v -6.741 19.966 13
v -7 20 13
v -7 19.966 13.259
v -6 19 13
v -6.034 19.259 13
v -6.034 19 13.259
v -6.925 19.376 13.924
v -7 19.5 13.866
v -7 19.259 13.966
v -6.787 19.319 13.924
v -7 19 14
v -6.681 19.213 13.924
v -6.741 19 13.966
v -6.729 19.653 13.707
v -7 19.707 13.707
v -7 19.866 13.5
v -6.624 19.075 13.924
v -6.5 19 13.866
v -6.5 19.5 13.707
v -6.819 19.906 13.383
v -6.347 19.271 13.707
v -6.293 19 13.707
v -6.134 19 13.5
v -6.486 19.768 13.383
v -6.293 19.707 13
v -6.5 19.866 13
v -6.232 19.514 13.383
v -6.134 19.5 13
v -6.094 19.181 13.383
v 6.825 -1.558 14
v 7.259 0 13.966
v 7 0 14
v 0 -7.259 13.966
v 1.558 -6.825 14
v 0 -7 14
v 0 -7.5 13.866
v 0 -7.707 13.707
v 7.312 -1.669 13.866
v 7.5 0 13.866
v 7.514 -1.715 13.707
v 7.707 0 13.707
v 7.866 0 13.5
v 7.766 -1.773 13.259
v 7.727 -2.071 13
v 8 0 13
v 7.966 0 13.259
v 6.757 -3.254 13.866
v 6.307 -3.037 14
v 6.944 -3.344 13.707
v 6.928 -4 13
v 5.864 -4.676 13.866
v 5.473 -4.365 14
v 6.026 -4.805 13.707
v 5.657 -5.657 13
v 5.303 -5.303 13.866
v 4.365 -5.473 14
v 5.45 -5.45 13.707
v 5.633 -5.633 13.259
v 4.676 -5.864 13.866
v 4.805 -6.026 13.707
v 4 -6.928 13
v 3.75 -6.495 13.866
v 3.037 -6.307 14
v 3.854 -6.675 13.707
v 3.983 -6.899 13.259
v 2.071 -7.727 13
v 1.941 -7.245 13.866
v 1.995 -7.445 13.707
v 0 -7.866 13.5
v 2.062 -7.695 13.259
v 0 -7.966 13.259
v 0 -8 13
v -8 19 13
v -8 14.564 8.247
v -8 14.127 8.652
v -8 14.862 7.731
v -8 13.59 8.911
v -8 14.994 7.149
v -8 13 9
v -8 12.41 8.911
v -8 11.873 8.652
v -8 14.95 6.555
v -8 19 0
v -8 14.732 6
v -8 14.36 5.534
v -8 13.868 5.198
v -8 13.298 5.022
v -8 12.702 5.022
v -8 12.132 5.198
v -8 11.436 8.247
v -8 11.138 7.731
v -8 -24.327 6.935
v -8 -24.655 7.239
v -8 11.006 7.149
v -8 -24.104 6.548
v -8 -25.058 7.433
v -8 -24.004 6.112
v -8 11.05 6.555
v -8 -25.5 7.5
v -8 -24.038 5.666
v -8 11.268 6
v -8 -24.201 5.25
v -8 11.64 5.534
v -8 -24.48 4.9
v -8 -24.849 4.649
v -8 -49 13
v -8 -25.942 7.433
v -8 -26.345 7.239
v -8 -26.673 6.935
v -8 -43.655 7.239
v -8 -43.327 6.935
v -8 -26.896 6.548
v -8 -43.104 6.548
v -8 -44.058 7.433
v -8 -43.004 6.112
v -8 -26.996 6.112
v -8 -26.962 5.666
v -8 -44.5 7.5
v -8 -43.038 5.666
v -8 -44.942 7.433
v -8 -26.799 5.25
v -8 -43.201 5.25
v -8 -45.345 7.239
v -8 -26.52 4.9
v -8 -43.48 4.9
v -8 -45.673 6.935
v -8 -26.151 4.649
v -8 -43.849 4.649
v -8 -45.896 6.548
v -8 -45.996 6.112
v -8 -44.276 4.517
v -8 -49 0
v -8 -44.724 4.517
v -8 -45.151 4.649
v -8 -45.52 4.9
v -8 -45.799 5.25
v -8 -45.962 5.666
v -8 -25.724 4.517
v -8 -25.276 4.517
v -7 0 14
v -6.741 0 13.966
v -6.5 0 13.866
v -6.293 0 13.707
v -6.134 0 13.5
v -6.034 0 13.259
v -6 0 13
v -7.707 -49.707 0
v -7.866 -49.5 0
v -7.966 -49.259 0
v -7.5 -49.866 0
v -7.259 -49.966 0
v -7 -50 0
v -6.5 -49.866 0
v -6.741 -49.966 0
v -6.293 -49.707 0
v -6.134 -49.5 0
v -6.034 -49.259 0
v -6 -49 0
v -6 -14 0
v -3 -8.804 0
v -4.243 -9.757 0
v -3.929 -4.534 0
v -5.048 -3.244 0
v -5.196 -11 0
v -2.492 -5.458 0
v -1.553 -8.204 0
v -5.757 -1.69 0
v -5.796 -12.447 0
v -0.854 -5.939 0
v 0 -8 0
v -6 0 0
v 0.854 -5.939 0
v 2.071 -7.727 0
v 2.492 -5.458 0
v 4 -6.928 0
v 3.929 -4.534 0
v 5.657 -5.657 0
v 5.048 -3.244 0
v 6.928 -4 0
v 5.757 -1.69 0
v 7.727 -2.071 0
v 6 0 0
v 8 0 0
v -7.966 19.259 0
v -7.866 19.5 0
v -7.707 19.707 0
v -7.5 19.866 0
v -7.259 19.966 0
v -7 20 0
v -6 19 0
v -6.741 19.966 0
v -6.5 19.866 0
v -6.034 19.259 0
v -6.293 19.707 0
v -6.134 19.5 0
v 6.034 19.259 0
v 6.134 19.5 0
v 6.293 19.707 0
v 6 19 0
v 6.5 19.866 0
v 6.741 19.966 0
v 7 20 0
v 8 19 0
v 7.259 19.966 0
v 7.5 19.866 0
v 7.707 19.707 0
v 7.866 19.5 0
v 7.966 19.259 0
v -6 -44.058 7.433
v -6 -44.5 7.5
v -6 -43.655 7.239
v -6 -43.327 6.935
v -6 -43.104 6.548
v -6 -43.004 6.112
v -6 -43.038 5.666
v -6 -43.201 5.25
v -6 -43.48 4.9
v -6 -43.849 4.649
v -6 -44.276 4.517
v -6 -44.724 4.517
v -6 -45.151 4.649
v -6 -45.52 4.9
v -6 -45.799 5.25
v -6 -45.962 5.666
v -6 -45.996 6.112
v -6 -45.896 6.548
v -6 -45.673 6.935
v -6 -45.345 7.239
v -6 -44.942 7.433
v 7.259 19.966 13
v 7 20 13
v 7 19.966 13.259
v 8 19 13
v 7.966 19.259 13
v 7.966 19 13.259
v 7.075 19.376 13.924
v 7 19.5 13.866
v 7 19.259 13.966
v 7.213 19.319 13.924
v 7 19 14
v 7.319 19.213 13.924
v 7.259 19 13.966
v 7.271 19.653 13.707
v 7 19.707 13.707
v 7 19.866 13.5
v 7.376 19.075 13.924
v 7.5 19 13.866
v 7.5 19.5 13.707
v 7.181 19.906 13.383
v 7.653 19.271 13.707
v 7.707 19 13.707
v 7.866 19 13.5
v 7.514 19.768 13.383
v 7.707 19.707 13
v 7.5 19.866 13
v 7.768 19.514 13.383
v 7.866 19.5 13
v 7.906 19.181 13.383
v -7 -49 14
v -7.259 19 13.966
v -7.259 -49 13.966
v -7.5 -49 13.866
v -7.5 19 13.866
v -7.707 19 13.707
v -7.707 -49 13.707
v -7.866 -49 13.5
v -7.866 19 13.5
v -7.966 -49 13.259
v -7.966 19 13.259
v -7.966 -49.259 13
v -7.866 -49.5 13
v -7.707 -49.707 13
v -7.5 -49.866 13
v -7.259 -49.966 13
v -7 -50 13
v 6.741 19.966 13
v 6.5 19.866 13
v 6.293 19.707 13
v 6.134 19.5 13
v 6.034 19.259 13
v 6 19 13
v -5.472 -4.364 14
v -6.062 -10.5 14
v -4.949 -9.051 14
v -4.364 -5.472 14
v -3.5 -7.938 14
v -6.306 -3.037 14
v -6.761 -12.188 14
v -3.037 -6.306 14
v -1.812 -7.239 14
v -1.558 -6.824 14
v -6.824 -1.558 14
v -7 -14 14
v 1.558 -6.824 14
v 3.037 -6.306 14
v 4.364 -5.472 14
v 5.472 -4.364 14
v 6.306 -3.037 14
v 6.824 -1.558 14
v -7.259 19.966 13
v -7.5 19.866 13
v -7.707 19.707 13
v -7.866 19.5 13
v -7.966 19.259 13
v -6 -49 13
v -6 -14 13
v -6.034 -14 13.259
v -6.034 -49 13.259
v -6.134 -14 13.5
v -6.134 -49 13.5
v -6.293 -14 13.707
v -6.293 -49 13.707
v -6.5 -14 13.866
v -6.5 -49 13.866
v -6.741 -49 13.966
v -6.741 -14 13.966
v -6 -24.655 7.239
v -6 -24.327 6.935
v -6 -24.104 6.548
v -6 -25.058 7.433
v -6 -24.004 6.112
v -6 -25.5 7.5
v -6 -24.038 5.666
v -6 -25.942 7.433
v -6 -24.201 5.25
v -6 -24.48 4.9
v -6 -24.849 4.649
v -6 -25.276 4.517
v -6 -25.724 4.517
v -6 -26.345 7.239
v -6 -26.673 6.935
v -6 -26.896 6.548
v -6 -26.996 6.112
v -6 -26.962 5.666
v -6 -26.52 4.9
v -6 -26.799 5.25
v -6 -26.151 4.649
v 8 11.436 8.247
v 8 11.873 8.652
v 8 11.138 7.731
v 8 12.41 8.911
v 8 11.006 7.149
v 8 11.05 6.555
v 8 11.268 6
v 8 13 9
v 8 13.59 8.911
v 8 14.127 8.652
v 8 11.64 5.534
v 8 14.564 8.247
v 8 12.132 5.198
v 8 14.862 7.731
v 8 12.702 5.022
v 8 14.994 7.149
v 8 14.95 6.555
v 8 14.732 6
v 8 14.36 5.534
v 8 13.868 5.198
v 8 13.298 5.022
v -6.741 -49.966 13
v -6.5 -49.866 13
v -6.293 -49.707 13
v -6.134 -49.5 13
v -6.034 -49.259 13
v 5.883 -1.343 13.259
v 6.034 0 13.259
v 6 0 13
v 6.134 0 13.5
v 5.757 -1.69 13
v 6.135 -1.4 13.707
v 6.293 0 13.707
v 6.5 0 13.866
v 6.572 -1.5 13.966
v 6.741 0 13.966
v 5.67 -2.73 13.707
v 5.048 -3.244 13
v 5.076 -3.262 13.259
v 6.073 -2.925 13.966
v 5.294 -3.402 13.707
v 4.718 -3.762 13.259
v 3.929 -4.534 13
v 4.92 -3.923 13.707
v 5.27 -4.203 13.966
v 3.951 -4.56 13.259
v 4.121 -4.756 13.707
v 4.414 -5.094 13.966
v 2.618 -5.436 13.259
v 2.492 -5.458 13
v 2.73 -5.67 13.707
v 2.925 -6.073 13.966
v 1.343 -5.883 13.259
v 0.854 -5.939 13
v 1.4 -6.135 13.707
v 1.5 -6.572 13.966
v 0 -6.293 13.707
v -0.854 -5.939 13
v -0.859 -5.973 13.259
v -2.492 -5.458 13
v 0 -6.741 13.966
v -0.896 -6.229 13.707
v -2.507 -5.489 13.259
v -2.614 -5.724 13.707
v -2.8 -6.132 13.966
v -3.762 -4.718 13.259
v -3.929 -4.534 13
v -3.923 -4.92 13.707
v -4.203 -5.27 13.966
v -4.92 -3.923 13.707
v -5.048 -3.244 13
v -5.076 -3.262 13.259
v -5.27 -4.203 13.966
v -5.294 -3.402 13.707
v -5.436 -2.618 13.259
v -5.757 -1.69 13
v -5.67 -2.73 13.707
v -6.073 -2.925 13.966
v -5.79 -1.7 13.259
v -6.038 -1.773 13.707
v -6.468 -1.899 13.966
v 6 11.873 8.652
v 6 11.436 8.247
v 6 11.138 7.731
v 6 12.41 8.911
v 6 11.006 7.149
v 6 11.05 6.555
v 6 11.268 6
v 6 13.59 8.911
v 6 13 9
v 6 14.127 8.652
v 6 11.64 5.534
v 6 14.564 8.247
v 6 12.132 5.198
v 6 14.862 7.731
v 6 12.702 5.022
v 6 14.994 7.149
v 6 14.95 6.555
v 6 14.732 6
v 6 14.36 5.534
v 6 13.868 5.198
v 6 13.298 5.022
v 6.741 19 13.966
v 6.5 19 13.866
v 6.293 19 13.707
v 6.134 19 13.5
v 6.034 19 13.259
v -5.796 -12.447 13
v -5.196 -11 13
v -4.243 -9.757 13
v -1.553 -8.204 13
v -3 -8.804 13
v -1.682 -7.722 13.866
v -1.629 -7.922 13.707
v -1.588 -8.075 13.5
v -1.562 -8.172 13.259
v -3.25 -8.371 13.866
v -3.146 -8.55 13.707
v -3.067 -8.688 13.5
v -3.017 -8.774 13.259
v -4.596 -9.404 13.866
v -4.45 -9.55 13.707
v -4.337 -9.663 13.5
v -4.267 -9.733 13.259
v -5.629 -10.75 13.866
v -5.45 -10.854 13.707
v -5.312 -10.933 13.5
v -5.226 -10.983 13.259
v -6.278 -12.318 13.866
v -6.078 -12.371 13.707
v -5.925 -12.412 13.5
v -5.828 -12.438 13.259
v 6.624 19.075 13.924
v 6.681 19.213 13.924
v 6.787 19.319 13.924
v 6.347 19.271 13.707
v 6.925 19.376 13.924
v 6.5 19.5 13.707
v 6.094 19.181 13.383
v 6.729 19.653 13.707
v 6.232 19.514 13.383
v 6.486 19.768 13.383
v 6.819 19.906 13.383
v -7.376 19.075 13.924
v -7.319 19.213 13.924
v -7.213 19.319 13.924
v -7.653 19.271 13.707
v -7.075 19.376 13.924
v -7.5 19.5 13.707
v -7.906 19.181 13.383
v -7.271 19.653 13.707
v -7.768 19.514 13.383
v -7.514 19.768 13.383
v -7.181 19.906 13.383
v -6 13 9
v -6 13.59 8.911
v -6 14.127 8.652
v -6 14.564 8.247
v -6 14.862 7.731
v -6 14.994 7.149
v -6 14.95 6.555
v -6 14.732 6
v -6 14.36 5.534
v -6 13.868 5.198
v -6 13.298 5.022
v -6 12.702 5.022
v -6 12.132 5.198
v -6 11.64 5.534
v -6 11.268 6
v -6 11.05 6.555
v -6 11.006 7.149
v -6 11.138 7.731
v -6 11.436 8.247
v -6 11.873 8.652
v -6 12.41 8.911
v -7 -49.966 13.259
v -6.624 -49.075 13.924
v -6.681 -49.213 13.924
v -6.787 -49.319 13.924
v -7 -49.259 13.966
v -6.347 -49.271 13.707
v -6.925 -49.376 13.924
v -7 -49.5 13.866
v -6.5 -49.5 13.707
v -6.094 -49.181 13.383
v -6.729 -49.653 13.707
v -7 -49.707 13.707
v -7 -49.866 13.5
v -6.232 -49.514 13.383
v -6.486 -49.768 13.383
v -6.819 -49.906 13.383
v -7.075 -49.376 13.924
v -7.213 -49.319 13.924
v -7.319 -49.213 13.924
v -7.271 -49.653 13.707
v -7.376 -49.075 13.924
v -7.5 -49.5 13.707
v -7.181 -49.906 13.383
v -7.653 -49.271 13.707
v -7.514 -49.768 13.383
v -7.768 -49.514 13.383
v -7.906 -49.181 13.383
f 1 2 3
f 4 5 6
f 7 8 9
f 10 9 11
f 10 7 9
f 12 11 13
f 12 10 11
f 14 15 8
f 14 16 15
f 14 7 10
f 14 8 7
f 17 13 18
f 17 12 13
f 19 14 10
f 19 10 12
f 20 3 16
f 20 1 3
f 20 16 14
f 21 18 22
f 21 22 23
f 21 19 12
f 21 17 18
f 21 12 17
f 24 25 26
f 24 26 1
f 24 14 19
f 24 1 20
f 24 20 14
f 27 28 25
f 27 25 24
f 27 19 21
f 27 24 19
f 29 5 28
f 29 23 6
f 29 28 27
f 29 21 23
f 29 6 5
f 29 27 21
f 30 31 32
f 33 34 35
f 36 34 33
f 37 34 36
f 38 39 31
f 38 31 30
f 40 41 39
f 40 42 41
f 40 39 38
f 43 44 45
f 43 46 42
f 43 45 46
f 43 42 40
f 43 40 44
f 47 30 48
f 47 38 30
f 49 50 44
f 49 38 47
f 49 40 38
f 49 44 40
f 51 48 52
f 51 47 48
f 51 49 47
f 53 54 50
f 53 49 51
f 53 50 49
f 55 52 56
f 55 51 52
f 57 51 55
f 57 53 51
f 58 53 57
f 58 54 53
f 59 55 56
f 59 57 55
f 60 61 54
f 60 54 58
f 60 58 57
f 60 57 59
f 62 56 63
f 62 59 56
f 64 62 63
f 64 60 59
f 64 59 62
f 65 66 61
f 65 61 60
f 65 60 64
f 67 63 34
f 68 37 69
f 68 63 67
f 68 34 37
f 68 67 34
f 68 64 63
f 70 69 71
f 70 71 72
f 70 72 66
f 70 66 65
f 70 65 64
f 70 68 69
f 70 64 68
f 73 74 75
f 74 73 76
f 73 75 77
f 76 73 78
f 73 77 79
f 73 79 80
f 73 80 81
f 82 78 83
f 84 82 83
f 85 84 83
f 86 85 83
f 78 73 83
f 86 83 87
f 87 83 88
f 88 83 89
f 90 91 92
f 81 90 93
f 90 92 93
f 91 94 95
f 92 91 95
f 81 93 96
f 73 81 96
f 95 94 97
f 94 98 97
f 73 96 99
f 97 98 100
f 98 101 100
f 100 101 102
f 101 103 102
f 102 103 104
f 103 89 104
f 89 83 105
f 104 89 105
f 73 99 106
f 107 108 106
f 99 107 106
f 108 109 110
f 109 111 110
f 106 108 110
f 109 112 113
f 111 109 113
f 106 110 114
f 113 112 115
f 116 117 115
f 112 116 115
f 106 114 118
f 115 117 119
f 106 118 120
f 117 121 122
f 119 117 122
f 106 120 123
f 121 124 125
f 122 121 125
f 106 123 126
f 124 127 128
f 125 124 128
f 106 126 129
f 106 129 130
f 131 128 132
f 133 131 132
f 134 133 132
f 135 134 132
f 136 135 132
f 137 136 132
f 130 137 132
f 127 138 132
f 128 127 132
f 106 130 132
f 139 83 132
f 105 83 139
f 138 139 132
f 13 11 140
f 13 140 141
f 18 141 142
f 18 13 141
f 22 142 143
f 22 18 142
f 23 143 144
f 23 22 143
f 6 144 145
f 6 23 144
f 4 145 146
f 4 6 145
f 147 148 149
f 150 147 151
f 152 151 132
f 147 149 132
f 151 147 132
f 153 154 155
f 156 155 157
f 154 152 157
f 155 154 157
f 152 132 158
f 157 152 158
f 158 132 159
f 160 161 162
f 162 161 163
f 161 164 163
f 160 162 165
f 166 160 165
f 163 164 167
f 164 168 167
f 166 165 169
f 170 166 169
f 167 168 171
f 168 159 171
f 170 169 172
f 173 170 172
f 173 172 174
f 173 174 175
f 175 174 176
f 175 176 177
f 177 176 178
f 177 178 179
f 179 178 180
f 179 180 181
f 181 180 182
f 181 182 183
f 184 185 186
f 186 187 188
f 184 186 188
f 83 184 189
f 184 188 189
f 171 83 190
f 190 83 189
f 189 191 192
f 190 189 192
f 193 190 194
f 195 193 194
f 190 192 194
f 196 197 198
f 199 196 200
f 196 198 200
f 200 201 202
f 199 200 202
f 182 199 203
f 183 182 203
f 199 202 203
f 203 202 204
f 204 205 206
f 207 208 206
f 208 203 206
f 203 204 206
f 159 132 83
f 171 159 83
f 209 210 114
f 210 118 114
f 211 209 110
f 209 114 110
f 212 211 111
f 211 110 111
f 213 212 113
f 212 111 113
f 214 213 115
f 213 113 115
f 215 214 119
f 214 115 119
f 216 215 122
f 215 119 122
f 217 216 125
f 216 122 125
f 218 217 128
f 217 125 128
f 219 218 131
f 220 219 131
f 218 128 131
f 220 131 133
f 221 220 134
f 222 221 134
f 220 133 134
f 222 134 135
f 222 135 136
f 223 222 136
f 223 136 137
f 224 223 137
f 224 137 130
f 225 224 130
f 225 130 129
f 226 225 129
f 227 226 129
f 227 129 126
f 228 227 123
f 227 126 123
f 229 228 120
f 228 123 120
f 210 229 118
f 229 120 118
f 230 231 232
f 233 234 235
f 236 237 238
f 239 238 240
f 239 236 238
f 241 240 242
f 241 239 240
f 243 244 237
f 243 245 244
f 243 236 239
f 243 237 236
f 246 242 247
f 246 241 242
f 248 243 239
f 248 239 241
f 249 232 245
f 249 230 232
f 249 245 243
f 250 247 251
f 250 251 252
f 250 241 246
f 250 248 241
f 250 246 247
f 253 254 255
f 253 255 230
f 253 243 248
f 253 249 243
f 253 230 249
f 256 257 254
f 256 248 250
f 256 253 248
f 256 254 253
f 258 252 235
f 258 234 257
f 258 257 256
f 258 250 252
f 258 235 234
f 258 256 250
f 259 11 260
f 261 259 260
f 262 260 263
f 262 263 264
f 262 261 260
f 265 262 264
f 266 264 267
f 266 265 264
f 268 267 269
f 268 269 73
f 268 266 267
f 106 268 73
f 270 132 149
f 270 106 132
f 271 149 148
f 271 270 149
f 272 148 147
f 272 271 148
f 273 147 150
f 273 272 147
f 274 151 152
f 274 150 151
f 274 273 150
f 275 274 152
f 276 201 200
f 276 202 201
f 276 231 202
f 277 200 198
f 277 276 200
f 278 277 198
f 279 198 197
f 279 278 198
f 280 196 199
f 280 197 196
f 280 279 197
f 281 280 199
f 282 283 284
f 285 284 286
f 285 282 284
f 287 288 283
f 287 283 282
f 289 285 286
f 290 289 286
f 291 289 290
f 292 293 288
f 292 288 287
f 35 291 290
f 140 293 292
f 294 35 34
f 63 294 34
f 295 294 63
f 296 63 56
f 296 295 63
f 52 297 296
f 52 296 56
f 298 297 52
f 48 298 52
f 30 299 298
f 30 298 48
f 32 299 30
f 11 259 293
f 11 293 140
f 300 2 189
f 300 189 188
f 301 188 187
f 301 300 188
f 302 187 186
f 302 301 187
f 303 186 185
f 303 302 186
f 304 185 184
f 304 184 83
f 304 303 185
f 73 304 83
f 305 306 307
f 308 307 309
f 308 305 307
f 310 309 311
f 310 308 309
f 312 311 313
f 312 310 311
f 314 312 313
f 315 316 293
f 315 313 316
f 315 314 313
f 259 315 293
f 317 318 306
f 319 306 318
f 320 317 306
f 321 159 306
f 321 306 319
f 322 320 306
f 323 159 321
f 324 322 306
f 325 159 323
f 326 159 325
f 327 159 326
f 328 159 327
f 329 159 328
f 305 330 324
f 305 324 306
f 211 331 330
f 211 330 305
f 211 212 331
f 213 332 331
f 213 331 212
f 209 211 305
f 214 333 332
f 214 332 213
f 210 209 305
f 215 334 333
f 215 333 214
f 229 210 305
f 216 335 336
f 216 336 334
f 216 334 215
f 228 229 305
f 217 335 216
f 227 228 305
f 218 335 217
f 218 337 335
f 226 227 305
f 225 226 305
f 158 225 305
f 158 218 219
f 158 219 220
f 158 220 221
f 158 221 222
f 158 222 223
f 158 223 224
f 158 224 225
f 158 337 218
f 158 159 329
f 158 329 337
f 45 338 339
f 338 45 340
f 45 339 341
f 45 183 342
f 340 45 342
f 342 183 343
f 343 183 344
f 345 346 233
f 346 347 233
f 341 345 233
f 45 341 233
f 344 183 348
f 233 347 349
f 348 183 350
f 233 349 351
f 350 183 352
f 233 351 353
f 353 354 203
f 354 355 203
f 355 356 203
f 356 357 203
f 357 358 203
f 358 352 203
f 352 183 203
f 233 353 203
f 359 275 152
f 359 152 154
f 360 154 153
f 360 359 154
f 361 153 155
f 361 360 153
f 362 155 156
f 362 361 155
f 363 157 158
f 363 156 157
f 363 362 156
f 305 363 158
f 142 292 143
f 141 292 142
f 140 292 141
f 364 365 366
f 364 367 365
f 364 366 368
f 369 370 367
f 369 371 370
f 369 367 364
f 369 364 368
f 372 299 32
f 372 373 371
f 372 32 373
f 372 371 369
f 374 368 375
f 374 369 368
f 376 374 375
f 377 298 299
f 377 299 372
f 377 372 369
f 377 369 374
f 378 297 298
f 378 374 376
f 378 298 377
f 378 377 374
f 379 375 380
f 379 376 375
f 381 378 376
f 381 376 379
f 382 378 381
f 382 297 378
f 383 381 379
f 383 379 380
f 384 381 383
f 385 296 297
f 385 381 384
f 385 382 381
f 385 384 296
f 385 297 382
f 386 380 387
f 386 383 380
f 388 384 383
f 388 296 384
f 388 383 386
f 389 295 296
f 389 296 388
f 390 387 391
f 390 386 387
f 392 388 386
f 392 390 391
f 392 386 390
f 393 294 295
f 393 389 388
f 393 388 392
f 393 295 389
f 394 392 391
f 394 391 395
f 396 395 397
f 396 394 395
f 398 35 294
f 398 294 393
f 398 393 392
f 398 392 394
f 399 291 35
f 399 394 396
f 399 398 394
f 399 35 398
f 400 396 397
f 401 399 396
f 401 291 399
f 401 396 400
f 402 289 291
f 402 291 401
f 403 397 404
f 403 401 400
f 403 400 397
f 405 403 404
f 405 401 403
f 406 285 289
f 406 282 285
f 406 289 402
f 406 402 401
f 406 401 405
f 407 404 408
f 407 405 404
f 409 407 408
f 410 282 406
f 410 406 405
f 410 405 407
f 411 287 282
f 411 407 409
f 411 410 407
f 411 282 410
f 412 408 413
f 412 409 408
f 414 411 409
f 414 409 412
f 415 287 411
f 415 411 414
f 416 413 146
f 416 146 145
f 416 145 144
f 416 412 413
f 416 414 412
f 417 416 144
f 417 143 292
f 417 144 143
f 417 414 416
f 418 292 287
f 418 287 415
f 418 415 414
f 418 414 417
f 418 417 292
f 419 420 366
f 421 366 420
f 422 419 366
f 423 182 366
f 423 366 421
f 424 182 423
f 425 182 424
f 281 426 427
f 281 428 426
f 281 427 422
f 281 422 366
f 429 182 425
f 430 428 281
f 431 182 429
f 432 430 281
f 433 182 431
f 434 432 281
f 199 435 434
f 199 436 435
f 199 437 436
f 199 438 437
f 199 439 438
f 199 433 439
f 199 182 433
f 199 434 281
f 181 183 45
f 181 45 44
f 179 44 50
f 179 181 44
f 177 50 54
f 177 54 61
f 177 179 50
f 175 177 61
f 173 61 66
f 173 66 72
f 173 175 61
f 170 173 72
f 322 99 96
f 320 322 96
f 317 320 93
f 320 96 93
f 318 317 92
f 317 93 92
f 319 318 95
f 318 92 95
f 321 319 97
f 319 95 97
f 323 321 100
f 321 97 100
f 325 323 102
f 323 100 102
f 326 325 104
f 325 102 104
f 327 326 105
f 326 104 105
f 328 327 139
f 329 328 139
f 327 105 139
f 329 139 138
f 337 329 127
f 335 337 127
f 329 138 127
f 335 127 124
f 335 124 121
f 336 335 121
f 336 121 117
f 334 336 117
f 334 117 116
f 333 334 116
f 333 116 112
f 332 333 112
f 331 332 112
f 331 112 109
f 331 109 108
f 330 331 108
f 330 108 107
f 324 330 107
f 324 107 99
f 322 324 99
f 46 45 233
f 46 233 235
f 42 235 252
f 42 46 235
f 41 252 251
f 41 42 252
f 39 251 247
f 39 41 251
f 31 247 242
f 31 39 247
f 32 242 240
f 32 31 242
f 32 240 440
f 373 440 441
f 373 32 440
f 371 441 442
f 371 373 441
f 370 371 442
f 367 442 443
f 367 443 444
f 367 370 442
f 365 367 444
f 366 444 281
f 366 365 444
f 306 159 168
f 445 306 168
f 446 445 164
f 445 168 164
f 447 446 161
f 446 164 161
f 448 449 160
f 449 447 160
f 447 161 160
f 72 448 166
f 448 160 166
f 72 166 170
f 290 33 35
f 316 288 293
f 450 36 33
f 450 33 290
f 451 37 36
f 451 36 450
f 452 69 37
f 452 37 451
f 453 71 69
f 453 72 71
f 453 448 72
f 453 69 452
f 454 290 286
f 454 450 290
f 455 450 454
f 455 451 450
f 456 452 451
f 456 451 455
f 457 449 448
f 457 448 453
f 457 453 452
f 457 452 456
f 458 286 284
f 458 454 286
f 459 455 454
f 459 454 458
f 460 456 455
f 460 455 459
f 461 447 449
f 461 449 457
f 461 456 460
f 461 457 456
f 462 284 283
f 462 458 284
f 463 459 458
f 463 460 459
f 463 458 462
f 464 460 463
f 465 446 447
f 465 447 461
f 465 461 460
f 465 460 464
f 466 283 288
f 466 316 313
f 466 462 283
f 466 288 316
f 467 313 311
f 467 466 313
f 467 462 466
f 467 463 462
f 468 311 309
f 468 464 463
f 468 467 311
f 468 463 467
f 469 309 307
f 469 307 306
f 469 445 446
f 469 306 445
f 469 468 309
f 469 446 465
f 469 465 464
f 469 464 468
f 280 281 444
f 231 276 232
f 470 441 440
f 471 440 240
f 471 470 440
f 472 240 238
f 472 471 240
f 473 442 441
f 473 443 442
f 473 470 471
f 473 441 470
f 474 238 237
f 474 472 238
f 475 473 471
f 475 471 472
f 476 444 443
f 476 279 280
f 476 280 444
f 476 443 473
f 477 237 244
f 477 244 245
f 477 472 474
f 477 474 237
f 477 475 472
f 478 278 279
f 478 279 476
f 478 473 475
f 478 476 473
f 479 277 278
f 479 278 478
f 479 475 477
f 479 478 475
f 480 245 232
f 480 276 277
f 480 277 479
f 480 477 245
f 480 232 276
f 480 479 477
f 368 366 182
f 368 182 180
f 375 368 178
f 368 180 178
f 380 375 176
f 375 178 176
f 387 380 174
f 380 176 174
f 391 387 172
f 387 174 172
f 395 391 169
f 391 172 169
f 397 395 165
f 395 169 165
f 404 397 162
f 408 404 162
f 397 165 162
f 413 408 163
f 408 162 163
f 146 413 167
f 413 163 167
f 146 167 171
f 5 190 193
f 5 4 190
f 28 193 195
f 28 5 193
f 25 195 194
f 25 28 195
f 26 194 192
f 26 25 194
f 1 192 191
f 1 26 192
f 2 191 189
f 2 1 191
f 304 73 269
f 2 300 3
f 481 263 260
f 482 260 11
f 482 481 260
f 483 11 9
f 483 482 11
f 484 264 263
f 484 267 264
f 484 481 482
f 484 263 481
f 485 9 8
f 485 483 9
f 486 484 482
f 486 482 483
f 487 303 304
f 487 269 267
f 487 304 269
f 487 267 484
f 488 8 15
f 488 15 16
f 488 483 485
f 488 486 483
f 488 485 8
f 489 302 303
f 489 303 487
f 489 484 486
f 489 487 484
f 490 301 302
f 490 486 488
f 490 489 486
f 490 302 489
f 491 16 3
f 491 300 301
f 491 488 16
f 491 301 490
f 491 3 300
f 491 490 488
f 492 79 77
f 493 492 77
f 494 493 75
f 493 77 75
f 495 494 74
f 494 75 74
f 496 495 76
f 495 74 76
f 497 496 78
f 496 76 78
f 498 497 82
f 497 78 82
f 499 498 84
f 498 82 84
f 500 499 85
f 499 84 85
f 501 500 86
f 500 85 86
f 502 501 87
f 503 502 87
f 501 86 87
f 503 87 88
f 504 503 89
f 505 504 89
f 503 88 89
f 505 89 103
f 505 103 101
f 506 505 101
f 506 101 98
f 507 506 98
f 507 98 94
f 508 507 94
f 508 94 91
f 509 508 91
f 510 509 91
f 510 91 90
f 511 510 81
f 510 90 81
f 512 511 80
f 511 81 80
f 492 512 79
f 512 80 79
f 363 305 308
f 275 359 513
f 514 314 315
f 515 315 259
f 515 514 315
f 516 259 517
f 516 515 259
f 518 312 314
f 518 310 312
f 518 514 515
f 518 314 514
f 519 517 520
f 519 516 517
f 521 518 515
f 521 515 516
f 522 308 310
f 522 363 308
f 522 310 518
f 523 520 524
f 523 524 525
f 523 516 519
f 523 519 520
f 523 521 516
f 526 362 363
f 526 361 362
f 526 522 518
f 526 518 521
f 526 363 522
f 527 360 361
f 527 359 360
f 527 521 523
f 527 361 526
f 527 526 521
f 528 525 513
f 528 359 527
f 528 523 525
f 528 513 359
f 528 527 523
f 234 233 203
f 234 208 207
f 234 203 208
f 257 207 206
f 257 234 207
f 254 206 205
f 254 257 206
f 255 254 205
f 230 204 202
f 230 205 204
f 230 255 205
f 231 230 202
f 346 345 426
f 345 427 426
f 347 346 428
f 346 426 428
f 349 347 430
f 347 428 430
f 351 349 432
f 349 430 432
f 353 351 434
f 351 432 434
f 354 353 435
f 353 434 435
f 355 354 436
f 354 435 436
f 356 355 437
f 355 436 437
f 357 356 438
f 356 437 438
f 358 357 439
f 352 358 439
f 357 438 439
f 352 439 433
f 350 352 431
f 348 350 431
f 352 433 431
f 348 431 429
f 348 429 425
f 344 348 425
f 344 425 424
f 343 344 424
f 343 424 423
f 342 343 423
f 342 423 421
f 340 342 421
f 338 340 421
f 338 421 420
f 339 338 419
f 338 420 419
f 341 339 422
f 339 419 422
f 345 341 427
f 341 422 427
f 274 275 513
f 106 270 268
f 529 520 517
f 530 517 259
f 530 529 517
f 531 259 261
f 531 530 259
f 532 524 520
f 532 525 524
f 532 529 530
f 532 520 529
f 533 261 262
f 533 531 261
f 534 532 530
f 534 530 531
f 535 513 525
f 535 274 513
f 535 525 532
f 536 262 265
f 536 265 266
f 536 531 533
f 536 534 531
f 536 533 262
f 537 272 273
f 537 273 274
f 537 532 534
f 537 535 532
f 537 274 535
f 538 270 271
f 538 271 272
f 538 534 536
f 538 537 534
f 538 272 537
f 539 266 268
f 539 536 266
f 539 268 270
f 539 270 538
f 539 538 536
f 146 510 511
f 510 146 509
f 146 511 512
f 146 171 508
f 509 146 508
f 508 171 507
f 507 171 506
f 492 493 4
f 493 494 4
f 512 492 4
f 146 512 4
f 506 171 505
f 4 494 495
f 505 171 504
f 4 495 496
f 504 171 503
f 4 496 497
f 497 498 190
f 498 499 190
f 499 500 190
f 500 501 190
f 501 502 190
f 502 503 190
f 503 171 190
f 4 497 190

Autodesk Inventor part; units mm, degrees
ref_plane "YZ Plane" through (0, 0, 0) normal (1, 0, 0) x (0, 1, 0)
ref_plane "XZ Plane" through (0, 0, 0) normal (0, 1, 0) x (-1, 0, 0)
ref_plane "XY Plane" through (0, 0, 0) normal (0, 0, 1) x (1, 0, 0)
sketch "Sketch1" plane through (0, 0, 0) normal (0, 0, 1) x (1, 0, 0)
  arc A0 (-6, 0) -> (6, 0) centre (0, 0) ccw
  arc A1 (0, -8) -> (8, 0) centre (0, 0) ccw
  line L0 (-6, -14) -> (-6, -50)
  line L1 (-8, 0) -> (-8, -50)
  line L2 (-6, 0) -> (-6, 20)
  line L3 (-8, 0) -> (-8, 20)
  line L4 (6, 0) -> (6, 20)
  line L5 (8, 0) -> (8, 20)
  line L6 (-8, -50) -> (-6, -50)
  line L7 (26.4346, -8) -> (-30.23, -8) construction
  arc A2 (0, -8) -> (-6, -14) centre (0, -14) ccw
  line L8 (8, 20) -> (6, 20)
  line L9 (-6, 20) -> (-8, 20)
  arc A3 (6, 0) -> (-6, 0) centre (0, 0) ccw construction
  dimension "d0" = 12
  dimension "d1" = 2
  dimension "d2" = 42
  dimension "d3" = 20
  dimension "d4" = 20
extrude "Extrusion1" add sketch "Sketch1" along normal blind 14
sketch "Sketch3" plane through (-8, -50, 0) normal (-1, 0, 0) x (0, 0, 1)
  line L0 (0, 0) -> (0, 70) projected
  line L1 (0, 0) -> (14, 0) projected
  line L2 (14, 70) -> (14, 0) projected
  line L3 (0, 70) -> (14, 70) projected
  line L4 (0, 42) -> (14, 42) projected
  circle A0 centre (6, 24.5) radius 1.5
  circle A1 centre (6, 5.5) radius 1.5
  line L5 (10.141, 23) -> (1.2635, 23) construction
  line L6 (10.6037, 7) -> (1.7262, 7) construction
  line L7 (6, 3.0673) -> (6, 29.9023) construction
  line L8 (9.9327, 26) -> (0.2455, 26) construction
  line L9 (10.6205, 4) -> (2.6453, 4) construction
  circle A2 centre (7, 63) radius 2
  line L10 (14, 54) -> (0, 54) construction
  point P0 (0, 50)
  dimension "d7" = 3
  dimension "d8" = 3
  dimension "d9" = 16
  dimension "d10" = 22
  dimension "d11" = 4
  dimension "d12" = 14
  dimension "d13" = 6
  dimension "d14" = 4
  dimension "d15" = 7
  dimension "d16" = 7
  dimension "d17" = 12
extrude "Extrusion2" cut sketch "Sketch3" against normal up to surface (16 mm away) contours A0 | A1 | A2
fillet "Fillet1" radius 1 17 edges at (8, 20, 7) (6, 20, 7) (-6, 20, 7) (-8, 20, 7) (-6, -50, 7) (-8, -50, 7) (-4.2426, -9.7574, 14) (5.6569, -5.6569, 14) (8, 10, 14) (-6, -32, 14) (-6, 10, 14) (6, 10, 14) (0, -6, 14) (-8, -15, 14) (-7, -50, 14) (7, 20, 14) (-7, 20, 14)
equation "\"d4\" = d3"
equation "\"d8\" = d7"
equation "\"d16\" = 0.5 * d12"
properties part number "Ø12-Z Endstop Holder"
